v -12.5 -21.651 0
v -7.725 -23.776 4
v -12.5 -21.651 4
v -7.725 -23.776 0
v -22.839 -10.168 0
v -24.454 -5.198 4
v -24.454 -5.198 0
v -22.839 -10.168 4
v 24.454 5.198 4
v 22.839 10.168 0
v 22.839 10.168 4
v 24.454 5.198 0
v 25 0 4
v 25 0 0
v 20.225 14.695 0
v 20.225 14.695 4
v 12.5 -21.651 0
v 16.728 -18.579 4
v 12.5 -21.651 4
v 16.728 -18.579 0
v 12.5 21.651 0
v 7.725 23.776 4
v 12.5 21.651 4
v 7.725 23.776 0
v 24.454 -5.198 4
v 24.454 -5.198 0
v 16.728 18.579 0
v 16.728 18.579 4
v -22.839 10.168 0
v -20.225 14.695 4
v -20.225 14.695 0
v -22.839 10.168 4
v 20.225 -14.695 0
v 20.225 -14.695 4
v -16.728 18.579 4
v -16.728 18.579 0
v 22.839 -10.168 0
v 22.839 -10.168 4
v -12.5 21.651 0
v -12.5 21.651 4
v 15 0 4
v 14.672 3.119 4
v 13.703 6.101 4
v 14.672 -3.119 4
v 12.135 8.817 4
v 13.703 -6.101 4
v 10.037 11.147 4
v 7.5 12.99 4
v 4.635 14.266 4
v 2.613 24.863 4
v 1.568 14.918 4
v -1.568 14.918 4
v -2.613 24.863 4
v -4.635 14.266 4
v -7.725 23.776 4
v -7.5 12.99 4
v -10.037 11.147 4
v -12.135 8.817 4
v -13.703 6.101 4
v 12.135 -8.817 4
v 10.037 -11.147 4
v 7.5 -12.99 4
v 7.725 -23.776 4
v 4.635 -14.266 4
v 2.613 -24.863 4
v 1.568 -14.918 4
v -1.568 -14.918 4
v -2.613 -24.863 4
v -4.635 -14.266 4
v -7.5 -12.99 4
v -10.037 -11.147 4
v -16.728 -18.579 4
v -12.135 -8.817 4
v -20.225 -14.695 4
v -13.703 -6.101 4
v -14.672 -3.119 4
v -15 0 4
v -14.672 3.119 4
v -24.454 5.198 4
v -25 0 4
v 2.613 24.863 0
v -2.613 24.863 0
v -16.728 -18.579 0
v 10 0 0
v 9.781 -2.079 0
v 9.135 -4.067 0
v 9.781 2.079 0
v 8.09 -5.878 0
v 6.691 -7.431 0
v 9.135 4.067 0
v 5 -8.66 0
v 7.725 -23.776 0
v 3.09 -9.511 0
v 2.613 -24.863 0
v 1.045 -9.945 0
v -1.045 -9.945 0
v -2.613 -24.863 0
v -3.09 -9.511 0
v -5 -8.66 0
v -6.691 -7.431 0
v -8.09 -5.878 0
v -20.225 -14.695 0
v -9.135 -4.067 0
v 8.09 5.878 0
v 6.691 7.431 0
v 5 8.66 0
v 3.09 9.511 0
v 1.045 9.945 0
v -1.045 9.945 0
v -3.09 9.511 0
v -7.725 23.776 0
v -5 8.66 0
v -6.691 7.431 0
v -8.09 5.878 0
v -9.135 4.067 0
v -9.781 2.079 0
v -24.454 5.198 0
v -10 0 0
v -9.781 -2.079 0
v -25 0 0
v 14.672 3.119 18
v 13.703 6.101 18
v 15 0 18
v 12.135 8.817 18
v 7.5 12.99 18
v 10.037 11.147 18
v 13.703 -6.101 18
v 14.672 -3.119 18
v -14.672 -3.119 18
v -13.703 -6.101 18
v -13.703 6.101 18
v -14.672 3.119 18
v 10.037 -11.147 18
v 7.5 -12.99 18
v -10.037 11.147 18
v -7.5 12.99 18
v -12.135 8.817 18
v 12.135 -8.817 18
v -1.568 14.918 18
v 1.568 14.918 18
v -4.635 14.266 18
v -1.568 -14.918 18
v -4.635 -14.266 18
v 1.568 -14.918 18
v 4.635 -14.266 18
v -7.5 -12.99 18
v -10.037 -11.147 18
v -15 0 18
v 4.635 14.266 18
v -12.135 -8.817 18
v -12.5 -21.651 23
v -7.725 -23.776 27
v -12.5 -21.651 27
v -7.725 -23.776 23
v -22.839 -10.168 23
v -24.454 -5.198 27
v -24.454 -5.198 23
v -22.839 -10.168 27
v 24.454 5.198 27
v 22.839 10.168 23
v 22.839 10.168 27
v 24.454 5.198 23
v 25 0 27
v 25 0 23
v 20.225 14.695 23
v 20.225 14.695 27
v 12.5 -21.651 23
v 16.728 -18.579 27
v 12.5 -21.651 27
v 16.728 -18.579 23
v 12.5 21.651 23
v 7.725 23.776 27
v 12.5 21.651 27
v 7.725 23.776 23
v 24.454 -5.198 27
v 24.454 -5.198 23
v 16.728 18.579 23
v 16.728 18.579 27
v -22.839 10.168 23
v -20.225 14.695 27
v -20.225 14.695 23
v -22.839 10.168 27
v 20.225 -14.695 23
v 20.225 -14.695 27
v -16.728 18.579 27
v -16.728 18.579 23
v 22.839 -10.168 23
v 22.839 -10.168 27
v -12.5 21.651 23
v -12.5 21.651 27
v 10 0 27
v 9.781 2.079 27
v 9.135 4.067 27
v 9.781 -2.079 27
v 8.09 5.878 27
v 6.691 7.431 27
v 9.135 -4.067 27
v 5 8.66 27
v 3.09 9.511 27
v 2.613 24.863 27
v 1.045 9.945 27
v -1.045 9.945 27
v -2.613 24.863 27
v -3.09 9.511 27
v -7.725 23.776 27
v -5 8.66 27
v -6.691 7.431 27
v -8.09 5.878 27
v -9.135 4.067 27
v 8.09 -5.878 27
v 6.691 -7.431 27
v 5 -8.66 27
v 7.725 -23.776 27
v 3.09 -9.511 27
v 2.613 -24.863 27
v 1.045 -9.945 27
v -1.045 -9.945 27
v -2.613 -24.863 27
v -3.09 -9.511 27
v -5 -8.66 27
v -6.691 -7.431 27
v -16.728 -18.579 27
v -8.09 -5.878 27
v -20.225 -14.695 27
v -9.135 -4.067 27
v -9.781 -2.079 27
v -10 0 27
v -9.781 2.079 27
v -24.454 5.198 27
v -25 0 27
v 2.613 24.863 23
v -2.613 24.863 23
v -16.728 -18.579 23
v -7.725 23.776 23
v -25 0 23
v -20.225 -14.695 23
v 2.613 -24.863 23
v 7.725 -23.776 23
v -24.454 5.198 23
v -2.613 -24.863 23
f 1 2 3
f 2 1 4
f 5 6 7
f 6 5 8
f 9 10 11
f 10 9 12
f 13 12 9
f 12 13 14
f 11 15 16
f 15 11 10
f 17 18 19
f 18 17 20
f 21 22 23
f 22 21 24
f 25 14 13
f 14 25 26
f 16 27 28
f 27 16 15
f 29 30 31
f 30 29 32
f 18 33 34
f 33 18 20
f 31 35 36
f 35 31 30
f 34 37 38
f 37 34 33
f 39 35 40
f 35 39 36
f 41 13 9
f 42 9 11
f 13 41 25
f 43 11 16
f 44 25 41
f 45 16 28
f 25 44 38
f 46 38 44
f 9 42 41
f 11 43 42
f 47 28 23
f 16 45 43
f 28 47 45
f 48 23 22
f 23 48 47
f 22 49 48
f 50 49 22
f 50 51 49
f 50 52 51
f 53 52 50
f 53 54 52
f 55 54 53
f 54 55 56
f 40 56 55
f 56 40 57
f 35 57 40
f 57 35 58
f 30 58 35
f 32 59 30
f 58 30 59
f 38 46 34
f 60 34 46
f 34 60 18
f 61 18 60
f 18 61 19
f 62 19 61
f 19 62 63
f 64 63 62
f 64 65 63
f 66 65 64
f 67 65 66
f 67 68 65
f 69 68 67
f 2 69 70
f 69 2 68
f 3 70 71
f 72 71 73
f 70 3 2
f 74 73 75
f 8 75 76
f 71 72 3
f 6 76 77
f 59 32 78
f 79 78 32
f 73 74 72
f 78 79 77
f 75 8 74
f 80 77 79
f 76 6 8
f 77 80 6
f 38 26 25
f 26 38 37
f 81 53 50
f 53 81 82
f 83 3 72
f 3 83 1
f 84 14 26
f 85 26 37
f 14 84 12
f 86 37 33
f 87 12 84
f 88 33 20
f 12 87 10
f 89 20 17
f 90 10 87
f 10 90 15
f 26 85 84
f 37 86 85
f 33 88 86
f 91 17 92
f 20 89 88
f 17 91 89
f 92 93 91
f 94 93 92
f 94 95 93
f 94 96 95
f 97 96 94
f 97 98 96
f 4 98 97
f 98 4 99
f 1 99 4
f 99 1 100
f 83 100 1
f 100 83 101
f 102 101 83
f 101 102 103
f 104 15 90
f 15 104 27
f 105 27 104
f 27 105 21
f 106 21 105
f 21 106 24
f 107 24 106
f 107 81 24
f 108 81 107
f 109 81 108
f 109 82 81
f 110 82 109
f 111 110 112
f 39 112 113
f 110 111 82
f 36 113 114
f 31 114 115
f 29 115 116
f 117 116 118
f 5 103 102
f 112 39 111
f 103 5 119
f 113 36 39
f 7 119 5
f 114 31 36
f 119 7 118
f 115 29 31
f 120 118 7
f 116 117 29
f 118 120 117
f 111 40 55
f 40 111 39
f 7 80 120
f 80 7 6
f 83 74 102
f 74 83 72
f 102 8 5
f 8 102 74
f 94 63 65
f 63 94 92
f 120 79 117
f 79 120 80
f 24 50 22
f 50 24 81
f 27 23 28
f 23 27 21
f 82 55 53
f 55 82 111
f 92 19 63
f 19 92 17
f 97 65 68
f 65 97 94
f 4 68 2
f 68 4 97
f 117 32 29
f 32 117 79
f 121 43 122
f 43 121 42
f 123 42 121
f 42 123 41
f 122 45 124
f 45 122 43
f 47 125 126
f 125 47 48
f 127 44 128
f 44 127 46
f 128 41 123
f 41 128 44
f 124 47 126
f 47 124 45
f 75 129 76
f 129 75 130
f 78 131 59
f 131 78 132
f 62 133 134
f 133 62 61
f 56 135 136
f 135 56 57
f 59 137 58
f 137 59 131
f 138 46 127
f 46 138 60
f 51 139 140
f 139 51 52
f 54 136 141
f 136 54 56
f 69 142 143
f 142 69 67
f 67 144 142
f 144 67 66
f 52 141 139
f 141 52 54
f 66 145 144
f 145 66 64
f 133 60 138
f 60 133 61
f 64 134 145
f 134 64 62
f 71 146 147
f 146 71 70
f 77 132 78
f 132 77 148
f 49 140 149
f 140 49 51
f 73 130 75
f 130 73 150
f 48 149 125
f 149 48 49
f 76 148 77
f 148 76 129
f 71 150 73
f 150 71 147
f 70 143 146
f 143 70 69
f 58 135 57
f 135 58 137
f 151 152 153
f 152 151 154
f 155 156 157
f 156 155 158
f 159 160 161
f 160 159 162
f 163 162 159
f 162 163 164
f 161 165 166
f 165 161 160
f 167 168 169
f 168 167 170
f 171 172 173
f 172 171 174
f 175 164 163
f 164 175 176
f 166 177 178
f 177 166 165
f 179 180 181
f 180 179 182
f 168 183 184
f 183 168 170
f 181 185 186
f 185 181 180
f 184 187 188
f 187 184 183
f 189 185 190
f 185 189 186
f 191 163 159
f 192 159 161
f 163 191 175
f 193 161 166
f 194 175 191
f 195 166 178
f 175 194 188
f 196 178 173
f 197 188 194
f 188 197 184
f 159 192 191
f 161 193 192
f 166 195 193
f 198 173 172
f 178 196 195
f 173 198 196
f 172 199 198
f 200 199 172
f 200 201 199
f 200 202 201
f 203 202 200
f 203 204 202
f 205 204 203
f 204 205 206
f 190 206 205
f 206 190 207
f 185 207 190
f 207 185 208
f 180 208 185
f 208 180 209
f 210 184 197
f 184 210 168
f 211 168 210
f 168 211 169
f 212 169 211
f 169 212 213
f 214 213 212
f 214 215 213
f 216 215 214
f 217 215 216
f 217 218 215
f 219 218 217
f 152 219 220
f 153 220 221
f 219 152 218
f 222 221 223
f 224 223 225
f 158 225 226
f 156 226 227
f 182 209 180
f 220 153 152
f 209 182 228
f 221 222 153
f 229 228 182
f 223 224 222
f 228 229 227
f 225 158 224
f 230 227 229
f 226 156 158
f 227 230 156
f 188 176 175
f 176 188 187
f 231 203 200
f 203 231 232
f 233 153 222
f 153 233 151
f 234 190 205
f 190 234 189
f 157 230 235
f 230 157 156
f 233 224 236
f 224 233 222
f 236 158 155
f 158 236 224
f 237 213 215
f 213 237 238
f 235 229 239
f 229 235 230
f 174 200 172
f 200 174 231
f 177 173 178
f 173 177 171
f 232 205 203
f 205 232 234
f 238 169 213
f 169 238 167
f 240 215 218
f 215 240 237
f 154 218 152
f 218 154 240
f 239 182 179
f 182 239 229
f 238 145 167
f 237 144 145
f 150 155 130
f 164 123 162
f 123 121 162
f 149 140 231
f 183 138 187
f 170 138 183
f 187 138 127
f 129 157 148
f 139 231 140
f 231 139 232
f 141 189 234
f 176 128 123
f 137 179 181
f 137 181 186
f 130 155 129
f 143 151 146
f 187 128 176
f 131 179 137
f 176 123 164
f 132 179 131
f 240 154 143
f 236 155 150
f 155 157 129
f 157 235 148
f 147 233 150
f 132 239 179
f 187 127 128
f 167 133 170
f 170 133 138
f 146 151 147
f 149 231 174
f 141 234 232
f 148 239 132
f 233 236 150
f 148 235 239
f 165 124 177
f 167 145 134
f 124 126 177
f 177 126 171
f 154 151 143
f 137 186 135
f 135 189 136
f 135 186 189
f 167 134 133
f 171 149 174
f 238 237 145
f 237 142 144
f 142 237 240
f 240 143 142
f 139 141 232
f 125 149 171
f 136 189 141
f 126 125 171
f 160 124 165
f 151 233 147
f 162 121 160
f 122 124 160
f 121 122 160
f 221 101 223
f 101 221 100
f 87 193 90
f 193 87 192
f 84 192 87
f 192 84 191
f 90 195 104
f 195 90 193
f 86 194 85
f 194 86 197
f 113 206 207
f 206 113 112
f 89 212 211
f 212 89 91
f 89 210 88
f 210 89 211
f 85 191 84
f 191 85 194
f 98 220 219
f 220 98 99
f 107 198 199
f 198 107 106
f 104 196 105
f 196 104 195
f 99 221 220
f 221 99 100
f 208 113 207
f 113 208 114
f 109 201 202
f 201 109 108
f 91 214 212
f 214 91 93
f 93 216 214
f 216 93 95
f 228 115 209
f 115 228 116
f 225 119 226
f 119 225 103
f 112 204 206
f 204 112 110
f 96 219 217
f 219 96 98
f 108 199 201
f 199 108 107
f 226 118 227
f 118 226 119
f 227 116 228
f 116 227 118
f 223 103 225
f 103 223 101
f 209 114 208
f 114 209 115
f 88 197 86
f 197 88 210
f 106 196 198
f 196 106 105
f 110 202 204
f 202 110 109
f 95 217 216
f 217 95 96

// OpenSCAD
//variables (mm)
	idlerID = 20;
	idlerOD = 30;
	beltwidth= 10;
	$fn=30; //faceting

//these are the lips that hold the belt on
	lipheight = 10;
	lipthickness = 4;
	topangle = 60; //the angle the top lip overhang makes. You can increase this to lower the idler profile.

//construction
	difference(){
	union(){
		cylinder(r=lipheight+idlerOD/2, h=lipthickness);
		cylinder(r=idlerOD/2, h = lipthickness*2+beltwidth+lipheight*cos(topangle));
		translate([0,0,lipthickness*2+beltwidth+lipheight*cos(topangle)])cylinder(r=lipheight+idlerOD/2, h=lipthickness);
		translate([0,0,beltwidth+lipthickness*2])cylinder(r1=idlerOD/2, r2=lipheight+idlerOD/2, h=lipheight*cos(topangle));
		}
		translate([0,0,-1])cylinder(r=idlerID/2, h=lipthickness*2+beltwidth+lipheight*2);
}
